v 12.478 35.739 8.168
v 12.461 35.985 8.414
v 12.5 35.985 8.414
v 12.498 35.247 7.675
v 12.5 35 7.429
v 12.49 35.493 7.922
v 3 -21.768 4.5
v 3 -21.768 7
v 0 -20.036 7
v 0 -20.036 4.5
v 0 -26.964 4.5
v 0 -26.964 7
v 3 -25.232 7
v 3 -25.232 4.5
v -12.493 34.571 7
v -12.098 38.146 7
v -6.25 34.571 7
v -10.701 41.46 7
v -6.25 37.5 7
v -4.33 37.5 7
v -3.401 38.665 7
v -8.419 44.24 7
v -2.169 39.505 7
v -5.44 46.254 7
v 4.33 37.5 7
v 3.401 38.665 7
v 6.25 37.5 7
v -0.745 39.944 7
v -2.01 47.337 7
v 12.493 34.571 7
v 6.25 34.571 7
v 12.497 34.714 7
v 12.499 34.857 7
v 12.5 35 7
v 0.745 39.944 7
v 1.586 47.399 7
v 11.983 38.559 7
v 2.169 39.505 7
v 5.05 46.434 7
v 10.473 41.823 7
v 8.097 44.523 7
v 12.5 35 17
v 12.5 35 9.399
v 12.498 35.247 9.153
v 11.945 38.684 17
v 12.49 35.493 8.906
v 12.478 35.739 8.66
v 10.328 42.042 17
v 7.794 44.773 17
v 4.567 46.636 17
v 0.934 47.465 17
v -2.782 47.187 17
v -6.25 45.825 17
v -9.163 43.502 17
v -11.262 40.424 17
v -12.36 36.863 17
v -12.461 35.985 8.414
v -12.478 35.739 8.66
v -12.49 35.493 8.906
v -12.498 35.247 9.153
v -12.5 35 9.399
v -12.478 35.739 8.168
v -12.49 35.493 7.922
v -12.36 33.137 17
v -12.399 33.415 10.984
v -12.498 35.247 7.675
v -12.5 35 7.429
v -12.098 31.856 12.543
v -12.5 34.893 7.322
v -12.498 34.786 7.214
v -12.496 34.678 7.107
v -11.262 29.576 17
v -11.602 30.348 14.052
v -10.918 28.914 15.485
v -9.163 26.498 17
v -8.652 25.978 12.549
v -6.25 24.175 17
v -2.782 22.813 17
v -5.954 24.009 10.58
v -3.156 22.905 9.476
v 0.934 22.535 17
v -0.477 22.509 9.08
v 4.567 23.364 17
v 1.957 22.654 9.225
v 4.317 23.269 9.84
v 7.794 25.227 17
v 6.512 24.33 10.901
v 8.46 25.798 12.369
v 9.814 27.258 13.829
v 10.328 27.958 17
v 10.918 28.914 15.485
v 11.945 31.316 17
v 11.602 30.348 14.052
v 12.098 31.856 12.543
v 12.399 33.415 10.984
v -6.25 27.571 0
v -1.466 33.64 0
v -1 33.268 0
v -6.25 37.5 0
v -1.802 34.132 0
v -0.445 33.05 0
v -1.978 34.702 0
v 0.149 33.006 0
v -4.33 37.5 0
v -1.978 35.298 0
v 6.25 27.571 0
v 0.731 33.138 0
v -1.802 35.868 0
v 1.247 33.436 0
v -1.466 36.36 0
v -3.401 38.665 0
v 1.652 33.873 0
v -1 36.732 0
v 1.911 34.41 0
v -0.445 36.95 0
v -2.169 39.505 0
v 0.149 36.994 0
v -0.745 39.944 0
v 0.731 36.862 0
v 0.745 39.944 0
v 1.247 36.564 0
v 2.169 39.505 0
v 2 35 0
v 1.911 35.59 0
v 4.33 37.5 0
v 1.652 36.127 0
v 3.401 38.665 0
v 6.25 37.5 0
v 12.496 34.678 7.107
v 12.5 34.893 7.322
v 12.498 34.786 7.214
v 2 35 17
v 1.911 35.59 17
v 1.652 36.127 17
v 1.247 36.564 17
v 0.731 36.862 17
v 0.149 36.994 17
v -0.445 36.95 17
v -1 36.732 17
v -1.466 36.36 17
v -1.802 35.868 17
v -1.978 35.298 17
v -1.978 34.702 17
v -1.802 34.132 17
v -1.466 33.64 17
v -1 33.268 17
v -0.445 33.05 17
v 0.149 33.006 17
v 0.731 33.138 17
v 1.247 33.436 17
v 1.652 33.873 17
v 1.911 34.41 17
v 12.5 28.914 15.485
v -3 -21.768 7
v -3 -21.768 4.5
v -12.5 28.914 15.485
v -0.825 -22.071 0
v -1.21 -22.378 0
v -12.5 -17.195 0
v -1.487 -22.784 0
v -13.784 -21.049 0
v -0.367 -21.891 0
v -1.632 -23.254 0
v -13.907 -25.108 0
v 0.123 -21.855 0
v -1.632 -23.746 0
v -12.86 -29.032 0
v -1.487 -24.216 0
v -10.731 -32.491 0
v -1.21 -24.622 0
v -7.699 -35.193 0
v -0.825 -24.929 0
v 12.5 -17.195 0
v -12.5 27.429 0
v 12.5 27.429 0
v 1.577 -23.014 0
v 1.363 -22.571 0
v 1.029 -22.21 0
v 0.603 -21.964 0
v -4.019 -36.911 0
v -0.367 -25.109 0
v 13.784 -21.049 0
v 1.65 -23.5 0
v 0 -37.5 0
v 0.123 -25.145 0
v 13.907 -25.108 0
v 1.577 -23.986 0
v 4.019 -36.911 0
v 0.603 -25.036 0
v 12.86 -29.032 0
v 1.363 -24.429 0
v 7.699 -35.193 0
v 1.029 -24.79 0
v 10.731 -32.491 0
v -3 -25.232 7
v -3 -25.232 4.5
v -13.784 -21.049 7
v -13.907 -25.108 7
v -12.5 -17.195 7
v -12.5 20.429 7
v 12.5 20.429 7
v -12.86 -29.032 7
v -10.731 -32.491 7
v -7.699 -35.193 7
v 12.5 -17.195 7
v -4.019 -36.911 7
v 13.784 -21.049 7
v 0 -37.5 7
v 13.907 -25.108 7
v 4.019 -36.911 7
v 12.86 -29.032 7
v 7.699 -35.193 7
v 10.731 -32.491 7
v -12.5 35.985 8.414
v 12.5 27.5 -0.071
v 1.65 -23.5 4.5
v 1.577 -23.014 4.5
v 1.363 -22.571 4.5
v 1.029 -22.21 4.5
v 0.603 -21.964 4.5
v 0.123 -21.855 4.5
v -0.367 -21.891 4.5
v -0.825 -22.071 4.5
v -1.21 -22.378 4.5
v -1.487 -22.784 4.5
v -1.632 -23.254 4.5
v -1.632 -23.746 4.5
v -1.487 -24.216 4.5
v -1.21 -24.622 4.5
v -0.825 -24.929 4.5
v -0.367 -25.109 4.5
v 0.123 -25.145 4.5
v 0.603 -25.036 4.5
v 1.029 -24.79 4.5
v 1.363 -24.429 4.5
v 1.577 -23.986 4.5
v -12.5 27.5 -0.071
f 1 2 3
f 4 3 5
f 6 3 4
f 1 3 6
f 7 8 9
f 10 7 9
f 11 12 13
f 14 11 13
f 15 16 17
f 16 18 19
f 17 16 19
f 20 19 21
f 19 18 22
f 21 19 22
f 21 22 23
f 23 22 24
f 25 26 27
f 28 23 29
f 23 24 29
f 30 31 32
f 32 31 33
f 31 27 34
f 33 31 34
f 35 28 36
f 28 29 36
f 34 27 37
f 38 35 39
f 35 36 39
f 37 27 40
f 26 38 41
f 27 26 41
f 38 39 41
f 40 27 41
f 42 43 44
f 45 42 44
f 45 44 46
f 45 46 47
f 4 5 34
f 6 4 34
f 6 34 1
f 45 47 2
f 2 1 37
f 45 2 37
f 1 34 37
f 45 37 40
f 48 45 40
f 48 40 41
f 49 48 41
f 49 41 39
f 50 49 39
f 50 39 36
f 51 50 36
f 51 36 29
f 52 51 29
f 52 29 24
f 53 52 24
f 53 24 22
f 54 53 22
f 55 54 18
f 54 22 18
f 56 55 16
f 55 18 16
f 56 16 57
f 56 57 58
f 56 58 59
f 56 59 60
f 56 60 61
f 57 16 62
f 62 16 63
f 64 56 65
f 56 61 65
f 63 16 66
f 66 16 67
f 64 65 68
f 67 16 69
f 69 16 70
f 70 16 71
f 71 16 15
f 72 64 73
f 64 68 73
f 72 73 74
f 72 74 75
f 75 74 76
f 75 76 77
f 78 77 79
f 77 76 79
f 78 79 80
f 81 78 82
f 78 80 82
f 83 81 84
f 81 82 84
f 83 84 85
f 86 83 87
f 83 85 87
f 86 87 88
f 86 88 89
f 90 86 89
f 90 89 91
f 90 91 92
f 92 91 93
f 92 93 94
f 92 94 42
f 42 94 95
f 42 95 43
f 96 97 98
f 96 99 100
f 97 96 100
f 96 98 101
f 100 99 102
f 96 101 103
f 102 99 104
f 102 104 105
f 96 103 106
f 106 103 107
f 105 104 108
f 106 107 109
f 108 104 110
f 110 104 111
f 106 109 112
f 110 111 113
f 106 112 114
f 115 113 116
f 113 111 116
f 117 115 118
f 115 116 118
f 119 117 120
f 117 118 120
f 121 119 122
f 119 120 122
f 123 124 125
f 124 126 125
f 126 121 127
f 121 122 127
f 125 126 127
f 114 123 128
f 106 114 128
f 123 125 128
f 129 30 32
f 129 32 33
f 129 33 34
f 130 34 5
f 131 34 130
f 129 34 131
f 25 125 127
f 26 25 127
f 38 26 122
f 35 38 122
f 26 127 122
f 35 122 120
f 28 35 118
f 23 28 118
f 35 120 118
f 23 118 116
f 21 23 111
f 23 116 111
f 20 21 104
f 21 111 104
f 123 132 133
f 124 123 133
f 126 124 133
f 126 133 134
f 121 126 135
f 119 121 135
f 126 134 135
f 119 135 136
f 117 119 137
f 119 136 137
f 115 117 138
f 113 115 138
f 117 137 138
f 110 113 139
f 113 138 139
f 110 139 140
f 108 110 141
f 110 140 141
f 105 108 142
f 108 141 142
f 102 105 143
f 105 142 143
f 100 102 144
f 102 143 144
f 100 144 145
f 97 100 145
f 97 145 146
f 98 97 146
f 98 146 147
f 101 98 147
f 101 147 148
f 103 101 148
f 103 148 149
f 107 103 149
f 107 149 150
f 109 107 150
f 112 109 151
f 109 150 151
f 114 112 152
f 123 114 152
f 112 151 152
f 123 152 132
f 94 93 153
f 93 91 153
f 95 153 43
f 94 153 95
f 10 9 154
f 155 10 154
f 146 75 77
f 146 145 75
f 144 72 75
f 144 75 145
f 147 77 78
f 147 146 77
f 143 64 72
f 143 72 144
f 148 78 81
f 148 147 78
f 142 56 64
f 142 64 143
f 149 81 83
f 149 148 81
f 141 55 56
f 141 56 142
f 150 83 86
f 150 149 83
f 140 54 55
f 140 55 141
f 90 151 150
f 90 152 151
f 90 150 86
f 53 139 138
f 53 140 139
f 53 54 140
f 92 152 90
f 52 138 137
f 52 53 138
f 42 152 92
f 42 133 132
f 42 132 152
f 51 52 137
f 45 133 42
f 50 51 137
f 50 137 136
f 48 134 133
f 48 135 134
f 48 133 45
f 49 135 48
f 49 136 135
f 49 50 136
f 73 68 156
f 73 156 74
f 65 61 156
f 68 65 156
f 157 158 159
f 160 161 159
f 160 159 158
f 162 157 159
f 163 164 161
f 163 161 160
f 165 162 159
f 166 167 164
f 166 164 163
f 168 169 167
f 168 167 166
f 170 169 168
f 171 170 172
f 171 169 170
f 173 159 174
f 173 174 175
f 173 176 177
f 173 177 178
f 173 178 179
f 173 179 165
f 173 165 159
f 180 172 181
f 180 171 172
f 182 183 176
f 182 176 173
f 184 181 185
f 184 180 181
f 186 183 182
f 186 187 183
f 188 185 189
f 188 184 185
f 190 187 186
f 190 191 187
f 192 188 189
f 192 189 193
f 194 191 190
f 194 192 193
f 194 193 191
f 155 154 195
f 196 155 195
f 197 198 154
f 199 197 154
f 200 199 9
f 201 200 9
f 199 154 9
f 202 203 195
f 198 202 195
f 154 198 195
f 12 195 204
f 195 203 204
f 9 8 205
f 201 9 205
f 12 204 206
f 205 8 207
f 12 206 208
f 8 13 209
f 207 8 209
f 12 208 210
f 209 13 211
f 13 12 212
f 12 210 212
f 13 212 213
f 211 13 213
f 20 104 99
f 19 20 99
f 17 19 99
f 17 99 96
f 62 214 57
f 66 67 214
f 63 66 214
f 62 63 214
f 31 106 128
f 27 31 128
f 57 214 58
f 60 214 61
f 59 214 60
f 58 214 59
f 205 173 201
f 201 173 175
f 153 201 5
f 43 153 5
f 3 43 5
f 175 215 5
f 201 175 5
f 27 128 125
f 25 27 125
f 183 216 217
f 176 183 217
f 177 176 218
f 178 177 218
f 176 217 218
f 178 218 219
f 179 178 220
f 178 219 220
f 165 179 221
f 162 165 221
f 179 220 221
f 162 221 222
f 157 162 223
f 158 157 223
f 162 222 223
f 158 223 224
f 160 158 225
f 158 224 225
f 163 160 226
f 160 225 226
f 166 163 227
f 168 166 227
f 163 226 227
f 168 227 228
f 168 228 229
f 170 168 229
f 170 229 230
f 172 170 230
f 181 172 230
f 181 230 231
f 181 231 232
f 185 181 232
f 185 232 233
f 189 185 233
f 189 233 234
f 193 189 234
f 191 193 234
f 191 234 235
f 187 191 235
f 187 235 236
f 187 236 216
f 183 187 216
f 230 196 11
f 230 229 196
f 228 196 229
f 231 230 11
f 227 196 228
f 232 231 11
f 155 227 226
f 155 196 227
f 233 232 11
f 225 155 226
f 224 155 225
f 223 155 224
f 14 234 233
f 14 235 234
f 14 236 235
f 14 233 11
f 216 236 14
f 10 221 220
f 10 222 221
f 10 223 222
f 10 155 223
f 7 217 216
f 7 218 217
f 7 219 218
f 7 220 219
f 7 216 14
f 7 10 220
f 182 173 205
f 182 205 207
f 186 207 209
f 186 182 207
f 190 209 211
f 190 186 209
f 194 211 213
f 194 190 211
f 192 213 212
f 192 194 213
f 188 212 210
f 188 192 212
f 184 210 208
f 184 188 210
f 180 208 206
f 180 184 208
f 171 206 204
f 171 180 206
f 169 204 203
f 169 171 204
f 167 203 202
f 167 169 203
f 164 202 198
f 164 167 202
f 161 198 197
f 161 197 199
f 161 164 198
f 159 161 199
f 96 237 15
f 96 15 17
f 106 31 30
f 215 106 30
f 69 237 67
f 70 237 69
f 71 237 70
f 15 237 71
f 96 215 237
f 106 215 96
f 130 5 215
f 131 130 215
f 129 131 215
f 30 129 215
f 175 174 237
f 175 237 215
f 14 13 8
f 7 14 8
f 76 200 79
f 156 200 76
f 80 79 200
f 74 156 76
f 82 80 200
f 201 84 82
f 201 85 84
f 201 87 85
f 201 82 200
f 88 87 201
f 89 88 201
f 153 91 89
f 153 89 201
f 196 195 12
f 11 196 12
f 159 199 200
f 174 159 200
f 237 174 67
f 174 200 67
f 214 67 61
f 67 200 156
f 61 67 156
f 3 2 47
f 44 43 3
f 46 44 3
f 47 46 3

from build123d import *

# Parameters (mm, degrees)
F1_DEPTH  = 7
F2_R      = 12.5
F3_DEPTH  = 10
F4_R      = 2
F5_DEPTH  = 7
F9_W      = 25
F9_H      = 12
F10_DEPTH = 10
F11_R     = 2
F12_DEPTH = 17
F13_R     = 14
F14_DEPTH = 7
F15_R     = 1.65
F16_DEPTH = 7
F18_DEPTH = 2.5


with BuildPart() as f1:
    # F0 (on Top) → F1 (new body)
    with BuildSketch(Plane.XY):
        Polygon((-12.5, -27.5), (12.5, -27.5), (12.5, 27.5), (6.25, 27.5), (-6.25, 27.5), (-12.5, 27.5), align=None)
        with BuildLine():
            Line((-6.25, 27.5), (6.25, 27.5))
            Line((6.25, 27.5), (6.25, 37.5))
            Line((6.25, 37.5), (4.3301270189, 37.5))
            ThreePointArc((4.3301270189, 37.5), (4.8296291314, 36.2940952255), (5, 35))
            ThreePointArc((5, 35), (-1.2940952255, 30.1703708686), (-4.3301270189, 37.5))
            Line((-4.3301270189, 37.5), (-6.25, 37.5))
            Line((-6.25, 37.5), (-6.25, 27.5))
        make_face()
        with BuildLine():
            ThreePointArc((5, 35), (4.8296291314, 36.2940952255), (4.3301270189, 37.5))
            Line((4.3301270189, 37.5), (-4.3301270189, 37.5))
            ThreePointArc((-4.3301270189, 37.5), (-1.2940952255, 30.1703708686), (5, 35))
        make_face()
        with BuildLine():
            Line((-4.3301270189, 37.5), (4.3301270189, 37.5))
            ThreePointArc((4.3301270189, 37.5), (0, 40), (-4.3301270189, 37.5))
        make_face()
    extrude(amount=F1_DEPTH)

    # F2 (on face) → F3 (join)
    with BuildSketch(Plane.XY.offset(7)):
        with Locations((0, 35)):
            Circle(F2_R)
    extrude(amount=F3_DEPTH)

    # F4 (on face) → F5 (cut, through all)
    with BuildSketch(Plane.XY.offset(7)):
        with Locations((0, -23.5)):
            Circle(F4_R)
    extrude(amount=-F5_DEPTH, mode=Mode.SUBTRACT)

    # F9 (on offset) → F10 (join)
    with BuildSketch(Plane(origin=(0, 6.7144660941, -6.7144660941), x_dir=(1, 0, 0), z_dir=(0, -0.7071067812, 0.7071067812))):
        with Locations((0, 25.3951839509)):
            Rectangle(F9_W, F9_H)
    extrude(amount=-F10_DEPTH)

    # F11 (on face) → F12 (cut, through all)
    with BuildSketch(Plane.XY.offset(17)):
        with Locations((0, 35)):
            Circle(F11_R)
    extrude(amount=-F12_DEPTH, mode=Mode.SUBTRACT)

    # F13 (on face) → F14 (join, through all)
    with BuildSketch(Plane(origin=(0, 0, 0), x_dir=(1, 0, 0), z_dir=(0, 0, -1))):
        with Locations((0, 23.5)):
            Circle(F13_R)
    extrude(amount=-F14_DEPTH)

    # F15 (on face) → F16 (cut, through all)
    with BuildSketch(Plane.XY.offset(7)):
        with Locations((0, -23.5)):
            Circle(F15_R)
    extrude(amount=-F16_DEPTH, mode=Mode.SUBTRACT)

    # F17 (on face) → F18 (cut)
    with BuildSketch(Plane.XY.offset(7)):
        Polygon((0, -26.9641016151), (3, -25.2320508076), (3, -21.7679491924), (0, -20.0358983849), (-3, -21.7679491924), (-3, -25.2320508076), align=None)
    extrude(amount=-F18_DEPTH, mode=Mode.SUBTRACT)


solid = f1.part
